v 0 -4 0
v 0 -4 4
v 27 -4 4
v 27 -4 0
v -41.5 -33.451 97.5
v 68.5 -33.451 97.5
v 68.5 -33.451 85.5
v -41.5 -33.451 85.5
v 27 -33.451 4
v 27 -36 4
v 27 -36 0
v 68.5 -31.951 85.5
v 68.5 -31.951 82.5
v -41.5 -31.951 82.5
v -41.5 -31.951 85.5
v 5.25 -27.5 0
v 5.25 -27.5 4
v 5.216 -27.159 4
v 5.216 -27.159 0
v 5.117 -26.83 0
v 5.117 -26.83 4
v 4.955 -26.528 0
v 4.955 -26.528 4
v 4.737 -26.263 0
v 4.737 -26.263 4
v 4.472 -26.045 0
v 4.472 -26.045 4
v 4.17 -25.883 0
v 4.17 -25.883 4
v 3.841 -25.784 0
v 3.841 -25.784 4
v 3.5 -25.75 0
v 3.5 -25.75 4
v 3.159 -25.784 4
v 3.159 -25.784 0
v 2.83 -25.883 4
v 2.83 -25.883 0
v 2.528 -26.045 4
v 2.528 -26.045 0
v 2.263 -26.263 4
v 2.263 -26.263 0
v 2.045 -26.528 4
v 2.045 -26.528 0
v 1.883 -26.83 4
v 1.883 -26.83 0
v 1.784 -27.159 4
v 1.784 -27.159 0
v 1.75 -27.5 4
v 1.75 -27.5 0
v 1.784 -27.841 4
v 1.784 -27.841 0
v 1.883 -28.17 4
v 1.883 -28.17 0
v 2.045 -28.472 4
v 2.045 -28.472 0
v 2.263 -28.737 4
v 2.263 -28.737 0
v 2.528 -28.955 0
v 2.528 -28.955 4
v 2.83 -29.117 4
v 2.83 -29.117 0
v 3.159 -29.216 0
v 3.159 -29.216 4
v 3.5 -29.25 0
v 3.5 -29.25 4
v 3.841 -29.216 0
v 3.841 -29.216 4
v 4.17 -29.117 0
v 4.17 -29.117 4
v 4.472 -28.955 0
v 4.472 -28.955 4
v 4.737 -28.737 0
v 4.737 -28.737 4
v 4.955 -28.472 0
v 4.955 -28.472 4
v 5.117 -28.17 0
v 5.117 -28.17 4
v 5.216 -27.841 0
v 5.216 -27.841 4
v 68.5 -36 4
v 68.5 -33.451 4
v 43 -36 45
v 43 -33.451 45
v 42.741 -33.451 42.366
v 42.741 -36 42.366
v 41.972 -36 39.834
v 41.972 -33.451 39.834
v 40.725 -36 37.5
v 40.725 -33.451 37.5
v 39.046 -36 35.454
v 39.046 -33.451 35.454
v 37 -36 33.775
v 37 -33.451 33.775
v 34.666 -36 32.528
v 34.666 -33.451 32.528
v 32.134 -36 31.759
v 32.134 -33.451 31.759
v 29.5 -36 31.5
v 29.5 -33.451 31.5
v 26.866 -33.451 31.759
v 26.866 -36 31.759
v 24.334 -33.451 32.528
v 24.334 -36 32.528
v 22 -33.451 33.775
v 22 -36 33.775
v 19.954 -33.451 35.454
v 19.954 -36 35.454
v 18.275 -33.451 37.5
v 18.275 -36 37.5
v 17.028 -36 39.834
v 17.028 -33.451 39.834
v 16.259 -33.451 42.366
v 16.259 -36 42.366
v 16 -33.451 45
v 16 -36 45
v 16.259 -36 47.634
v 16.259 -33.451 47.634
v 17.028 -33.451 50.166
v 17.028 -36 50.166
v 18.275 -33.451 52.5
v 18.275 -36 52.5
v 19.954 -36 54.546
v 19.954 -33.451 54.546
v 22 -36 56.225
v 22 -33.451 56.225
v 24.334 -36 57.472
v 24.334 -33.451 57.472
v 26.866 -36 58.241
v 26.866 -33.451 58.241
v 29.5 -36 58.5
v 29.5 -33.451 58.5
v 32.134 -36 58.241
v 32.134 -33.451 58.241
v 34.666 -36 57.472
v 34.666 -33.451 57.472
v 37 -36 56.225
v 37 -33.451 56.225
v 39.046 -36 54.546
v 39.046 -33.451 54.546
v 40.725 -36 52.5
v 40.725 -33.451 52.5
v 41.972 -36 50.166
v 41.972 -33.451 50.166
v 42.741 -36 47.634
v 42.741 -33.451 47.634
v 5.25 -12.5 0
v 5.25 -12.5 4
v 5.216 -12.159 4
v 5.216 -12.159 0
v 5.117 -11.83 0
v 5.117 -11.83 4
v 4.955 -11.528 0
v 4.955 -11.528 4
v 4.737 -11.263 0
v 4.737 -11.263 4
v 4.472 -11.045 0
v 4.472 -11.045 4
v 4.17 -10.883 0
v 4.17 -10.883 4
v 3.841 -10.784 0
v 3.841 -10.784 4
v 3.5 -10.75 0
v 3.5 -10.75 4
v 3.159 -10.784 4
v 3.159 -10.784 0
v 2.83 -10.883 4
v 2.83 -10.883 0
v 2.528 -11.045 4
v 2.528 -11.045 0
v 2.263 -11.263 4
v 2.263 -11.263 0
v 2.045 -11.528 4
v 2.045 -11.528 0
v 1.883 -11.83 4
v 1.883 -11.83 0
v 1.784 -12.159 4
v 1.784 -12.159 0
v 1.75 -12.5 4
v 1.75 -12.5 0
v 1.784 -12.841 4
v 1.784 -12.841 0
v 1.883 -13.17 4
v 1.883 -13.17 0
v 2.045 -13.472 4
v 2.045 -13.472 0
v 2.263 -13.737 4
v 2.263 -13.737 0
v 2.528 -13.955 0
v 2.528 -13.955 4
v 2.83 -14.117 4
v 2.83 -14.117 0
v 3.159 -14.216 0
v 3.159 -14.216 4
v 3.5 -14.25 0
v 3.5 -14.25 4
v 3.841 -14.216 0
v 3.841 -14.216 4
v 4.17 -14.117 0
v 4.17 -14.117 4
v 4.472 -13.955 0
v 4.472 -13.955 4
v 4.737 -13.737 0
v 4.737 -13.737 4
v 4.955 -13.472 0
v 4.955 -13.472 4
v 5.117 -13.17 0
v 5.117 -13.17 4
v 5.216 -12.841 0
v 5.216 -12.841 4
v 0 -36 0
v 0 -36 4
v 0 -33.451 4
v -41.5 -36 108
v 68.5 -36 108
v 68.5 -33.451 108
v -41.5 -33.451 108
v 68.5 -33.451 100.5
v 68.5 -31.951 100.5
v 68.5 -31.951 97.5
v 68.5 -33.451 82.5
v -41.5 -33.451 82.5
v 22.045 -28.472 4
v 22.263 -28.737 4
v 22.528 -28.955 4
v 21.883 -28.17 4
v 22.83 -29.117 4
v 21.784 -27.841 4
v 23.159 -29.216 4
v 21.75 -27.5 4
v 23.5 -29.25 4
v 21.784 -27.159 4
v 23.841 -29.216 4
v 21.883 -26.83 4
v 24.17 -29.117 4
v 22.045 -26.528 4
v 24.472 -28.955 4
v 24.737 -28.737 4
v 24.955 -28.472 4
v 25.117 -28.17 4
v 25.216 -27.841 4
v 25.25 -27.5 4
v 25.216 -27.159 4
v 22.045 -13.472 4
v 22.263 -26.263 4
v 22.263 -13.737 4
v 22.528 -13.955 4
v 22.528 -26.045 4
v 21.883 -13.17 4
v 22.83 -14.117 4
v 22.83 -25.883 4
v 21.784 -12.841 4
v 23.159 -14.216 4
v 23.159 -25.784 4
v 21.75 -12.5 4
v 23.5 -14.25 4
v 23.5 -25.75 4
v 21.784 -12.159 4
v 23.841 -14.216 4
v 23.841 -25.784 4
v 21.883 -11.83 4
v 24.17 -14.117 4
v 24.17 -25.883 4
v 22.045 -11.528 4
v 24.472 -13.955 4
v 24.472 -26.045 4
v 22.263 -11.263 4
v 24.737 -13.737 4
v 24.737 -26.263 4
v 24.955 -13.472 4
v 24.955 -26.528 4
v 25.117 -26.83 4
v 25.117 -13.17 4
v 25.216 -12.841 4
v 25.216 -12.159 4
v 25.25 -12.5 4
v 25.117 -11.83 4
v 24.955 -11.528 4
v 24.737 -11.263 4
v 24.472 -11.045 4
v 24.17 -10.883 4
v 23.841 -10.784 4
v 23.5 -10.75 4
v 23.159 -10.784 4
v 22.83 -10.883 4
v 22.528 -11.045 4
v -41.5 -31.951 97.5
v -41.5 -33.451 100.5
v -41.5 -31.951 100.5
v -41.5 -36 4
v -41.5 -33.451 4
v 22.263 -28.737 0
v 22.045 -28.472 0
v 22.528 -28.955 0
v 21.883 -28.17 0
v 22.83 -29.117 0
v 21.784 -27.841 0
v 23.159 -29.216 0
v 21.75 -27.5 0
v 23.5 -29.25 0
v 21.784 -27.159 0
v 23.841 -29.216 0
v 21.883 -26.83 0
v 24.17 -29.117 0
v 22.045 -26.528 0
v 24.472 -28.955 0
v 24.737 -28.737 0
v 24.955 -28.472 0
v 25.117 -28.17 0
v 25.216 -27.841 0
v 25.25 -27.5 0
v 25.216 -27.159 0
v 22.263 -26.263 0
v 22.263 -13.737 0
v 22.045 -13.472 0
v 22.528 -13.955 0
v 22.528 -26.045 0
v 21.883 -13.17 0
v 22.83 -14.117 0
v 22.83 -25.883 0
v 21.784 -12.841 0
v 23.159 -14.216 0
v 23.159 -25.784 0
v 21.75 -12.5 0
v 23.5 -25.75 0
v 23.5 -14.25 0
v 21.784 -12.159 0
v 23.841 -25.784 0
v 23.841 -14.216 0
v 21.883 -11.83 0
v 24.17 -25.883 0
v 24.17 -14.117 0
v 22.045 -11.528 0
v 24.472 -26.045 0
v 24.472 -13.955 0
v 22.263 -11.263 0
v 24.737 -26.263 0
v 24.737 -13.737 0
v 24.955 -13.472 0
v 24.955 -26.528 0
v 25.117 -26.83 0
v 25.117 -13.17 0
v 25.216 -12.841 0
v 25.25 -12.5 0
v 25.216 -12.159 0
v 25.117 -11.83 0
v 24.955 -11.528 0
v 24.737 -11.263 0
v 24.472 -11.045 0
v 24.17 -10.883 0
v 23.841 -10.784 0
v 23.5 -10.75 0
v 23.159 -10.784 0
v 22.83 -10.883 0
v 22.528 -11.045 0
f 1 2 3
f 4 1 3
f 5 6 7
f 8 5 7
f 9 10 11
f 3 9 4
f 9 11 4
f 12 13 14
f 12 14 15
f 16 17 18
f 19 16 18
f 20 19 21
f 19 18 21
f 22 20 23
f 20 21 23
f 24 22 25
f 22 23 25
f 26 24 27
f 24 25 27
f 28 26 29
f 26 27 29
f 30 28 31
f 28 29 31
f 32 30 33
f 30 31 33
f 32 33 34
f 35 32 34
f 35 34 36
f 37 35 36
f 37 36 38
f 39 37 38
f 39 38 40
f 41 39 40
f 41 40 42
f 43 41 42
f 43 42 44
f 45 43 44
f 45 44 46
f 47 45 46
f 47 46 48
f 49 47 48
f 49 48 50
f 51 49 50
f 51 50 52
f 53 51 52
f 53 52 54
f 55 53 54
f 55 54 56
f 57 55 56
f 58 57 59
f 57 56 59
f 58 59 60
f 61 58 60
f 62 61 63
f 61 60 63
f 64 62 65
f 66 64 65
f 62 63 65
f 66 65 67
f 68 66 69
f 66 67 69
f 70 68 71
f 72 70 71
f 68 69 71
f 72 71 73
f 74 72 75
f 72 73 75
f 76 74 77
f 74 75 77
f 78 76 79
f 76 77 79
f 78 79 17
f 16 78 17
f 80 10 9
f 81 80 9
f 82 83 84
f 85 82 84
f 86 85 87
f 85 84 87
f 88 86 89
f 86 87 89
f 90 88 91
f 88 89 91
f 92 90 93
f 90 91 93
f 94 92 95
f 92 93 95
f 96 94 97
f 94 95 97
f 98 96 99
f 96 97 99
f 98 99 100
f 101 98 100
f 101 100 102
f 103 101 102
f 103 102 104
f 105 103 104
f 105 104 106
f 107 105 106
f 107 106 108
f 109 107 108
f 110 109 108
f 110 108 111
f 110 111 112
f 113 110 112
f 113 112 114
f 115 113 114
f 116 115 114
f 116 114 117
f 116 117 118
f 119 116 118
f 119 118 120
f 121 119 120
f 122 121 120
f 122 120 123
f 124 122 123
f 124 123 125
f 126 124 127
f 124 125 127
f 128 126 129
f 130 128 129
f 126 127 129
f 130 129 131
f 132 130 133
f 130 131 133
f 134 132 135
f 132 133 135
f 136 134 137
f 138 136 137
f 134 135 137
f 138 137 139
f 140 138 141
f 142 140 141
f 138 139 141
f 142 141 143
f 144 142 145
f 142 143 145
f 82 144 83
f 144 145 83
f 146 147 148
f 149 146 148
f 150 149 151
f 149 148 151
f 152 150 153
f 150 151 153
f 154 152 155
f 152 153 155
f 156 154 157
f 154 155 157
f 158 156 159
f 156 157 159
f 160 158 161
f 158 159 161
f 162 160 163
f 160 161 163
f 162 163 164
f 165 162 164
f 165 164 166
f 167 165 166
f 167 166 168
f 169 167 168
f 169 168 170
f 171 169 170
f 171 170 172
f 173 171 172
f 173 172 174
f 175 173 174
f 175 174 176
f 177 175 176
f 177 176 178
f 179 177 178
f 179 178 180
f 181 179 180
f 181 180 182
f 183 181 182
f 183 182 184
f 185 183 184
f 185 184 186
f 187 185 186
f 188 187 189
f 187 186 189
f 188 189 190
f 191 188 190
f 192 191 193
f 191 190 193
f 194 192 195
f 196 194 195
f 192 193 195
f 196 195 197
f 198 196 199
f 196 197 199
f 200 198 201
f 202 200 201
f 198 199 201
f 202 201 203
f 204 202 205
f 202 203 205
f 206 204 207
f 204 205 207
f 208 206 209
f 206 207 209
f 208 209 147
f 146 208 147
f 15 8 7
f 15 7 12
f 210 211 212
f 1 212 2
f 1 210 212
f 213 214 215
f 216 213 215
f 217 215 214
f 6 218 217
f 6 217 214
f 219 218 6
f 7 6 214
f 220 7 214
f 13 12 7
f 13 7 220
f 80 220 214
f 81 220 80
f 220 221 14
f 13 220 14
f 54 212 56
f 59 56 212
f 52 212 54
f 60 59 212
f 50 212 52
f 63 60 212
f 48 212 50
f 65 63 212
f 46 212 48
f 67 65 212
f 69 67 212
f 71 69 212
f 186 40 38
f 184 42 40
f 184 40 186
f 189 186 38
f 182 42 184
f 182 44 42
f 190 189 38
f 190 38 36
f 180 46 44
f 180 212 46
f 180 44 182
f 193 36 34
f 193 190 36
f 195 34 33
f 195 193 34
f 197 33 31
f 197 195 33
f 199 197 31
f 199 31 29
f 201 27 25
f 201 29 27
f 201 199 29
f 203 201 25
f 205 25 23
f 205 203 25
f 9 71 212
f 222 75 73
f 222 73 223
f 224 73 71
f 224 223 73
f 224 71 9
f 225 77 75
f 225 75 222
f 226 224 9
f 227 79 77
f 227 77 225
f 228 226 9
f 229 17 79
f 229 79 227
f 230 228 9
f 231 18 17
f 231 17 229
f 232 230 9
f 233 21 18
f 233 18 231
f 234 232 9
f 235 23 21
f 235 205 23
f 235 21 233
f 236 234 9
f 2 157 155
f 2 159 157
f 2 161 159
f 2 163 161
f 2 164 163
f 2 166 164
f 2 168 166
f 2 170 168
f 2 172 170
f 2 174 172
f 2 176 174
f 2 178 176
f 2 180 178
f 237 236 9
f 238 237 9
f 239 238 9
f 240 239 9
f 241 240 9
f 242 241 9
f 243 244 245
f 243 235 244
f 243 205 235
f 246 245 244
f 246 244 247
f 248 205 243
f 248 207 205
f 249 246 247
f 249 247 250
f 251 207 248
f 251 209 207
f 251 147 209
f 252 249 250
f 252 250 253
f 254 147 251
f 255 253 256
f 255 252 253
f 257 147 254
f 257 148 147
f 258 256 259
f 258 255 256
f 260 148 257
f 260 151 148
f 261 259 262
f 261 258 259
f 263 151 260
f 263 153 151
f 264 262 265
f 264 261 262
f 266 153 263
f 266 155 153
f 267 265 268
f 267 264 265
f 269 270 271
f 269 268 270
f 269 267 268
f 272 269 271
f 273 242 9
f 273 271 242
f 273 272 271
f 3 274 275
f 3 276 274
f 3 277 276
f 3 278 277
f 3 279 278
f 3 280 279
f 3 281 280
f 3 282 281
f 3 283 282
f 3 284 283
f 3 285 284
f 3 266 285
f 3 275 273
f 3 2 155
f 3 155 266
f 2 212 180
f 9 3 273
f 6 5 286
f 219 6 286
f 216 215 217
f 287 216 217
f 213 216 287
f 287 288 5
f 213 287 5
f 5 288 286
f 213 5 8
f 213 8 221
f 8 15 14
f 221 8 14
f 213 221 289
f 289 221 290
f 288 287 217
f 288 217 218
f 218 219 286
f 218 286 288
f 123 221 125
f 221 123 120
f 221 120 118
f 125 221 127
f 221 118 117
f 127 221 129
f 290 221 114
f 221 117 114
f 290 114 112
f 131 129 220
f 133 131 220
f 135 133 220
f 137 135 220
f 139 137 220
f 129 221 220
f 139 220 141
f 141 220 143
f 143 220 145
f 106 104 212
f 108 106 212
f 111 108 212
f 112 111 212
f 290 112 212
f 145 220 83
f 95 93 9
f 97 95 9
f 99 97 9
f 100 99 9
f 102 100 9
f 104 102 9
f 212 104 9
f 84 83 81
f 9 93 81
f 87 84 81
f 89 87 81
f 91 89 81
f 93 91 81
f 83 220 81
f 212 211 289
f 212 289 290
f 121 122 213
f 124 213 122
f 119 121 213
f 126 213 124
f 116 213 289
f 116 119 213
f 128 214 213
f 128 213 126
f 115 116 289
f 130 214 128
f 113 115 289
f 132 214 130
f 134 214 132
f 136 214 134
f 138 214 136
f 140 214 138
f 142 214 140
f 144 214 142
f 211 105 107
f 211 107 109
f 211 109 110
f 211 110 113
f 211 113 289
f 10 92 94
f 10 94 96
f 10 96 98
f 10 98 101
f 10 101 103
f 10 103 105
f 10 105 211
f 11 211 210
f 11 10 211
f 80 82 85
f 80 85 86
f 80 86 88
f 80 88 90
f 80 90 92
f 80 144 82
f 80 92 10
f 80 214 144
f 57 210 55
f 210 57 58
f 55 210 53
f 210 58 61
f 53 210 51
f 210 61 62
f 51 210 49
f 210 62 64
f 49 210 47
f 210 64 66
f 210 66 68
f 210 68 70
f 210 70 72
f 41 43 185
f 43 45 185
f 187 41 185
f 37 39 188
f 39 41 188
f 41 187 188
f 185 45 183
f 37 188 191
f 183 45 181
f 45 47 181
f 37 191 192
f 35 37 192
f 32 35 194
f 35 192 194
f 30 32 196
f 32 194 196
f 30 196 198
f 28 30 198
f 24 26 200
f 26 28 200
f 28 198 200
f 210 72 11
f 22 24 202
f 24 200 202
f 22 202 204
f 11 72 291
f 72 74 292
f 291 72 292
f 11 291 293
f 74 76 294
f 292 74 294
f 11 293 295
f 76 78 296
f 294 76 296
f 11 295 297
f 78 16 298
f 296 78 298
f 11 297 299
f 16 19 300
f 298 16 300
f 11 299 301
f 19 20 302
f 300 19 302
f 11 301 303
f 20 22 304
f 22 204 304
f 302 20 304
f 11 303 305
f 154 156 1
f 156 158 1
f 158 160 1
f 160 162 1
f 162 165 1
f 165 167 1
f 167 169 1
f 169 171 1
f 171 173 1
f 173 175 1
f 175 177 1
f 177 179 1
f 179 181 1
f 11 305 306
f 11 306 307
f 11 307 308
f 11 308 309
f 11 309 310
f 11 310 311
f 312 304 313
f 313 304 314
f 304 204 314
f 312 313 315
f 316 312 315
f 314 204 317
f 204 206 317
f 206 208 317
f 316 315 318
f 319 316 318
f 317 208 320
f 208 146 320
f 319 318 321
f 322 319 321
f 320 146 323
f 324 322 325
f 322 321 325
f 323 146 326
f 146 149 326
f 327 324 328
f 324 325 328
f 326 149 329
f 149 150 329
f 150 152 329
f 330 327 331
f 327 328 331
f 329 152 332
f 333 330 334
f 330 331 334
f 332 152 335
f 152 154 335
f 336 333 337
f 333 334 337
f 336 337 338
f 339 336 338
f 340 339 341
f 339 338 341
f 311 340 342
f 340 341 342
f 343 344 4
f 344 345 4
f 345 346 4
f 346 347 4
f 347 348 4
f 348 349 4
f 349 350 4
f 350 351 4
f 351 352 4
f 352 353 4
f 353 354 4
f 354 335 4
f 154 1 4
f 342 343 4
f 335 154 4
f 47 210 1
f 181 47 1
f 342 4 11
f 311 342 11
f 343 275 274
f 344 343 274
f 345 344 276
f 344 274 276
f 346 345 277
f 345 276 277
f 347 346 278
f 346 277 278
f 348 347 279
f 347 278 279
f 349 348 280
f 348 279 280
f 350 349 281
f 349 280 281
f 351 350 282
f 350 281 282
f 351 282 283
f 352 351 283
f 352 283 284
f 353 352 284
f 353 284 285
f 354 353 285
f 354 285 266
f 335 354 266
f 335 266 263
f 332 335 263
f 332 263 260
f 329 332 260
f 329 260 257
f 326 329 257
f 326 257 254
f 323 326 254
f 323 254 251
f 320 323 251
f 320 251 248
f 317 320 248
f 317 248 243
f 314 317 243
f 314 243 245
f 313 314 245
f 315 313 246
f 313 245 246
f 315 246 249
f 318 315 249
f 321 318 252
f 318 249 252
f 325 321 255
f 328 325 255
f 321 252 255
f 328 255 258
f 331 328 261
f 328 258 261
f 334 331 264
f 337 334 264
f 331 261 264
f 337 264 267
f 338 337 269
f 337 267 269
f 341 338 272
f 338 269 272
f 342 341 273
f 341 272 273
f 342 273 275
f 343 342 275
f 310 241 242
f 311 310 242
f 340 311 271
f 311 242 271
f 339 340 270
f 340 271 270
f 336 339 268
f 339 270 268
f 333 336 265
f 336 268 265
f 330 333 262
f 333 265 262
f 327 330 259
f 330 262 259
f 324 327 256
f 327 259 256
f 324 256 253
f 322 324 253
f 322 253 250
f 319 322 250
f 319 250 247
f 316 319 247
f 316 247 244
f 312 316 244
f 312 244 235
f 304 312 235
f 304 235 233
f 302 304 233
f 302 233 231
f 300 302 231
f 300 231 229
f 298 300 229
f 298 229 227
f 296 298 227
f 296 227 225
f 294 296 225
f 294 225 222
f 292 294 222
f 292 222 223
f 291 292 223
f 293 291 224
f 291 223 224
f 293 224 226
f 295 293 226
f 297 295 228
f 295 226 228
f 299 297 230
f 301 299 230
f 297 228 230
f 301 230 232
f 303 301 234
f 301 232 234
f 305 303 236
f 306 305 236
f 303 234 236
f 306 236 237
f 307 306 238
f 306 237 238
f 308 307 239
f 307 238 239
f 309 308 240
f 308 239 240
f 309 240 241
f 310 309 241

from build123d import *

# Parameters (mm, degrees)
SCHIZZO1_W                        = 27
SCHIZZO1_H                        = 36
ESTRUSIONE_ESTRUSIONE1_DEPTH      = 4
SCHIZZO10_R                       = 1.75
TAGLIO_ESTRUSIONE5_DEPTH          = 10
SCHIZZO12_W                       = 104
SCHIZZO12_H                       = 2.549259356
ESTRUSIONE_ESTRUSIONE2_DEPTH      = 55
ESTRUSIONE_ESTRUSIONE2_DEPTH_BACK = 55
SCHIZZO14_W                       = 3
SCHIZZO14_H                       = 1.5
ESTRUSIONE_ESTRUSIONE3_DEPTH      = 110
SCHIZZO15_W                       = 27
SCHIZZO15_H                       = 4
TAGLIO_ESTRUSIONE6_DEPTH          = 5
SCHIZZO16_R                       = 13.5
TAGLIO_ESTRUSIONE7_DEPTH          = 10


with BuildPart() as part:
    # Schizzo1 → Estrusione-Estrusione1 (new body)
    with BuildSketch(Plane.XY):
        with Locations((13.5, -18)):
            Rectangle(SCHIZZO1_W, SCHIZZO1_H)
    extrude(amount=ESTRUSIONE_ESTRUSIONE1_DEPTH)

    # Schizzo10 → Taglio-Estrusione5 (cut)
    with BuildSketch(Plane.XY.offset(4)):
        with Locations((3.5, -12.5)):
            Circle(SCHIZZO10_R)
        with Locations((23.5, -12.5)):
            Circle(SCHIZZO10_R)
        with Locations((23.5, -27.5)):
            Circle(SCHIZZO10_R)
        with Locations((3.5, -27.5)):
            Circle(SCHIZZO10_R)
    extrude(amount=-TAGLIO_ESTRUSIONE5_DEPTH, mode=Mode.SUBTRACT)

    # Schizzo12 → Estrusione-Estrusione2 (add, two sides)
    with BuildSketch(Plane(origin=(13.5, 0, 0), x_dir=(0, 0, -1), z_dir=(1, 0, 0))) as estrusione_estrusione2_sk:
        with Locations((-56, -34.725370322)):
            Rectangle(SCHIZZO12_W, SCHIZZO12_H)
    extrude(amount=ESTRUSIONE_ESTRUSIONE2_DEPTH)
    extrude(estrusione_estrusione2_sk.sketch, amount=-ESTRUSIONE_ESTRUSIONE2_DEPTH_BACK)

    # Schizzo14 → Estrusione-Estrusione3 (add)
    with BuildSketch(Plane.ZY.offset(41.5)):
        with Locations((84, -32.700740644)):
            Rectangle(SCHIZZO14_W, SCHIZZO14_H)
        with Locations((99, -32.700740644)):
            Rectangle(SCHIZZO14_W, SCHIZZO14_H)
    extrude(amount=-ESTRUSIONE_ESTRUSIONE3_DEPTH)

    # Schizzo15 → Taglio-Estrusione6 (cut, through all)
    with BuildSketch(Plane.XY.offset(4)):
        with Locations((13.5, -2)):
            Rectangle(SCHIZZO15_W, SCHIZZO15_H)
    extrude(amount=-TAGLIO_ESTRUSIONE6_DEPTH, mode=Mode.SUBTRACT)

    # Schizzo16 → Taglio-Estrusione7 (cut)
    with BuildSketch(Plane(origin=(0, -33.450740644, 0), x_dir=(1, 0, 0), z_dir=(0, 1, 0))):
        with Locations((29.5, -45)):
            Circle(SCHIZZO16_R)
    extrude(amount=-TAGLIO_ESTRUSIONE7_DEPTH, mode=Mode.SUBTRACT)


solid = part.part
